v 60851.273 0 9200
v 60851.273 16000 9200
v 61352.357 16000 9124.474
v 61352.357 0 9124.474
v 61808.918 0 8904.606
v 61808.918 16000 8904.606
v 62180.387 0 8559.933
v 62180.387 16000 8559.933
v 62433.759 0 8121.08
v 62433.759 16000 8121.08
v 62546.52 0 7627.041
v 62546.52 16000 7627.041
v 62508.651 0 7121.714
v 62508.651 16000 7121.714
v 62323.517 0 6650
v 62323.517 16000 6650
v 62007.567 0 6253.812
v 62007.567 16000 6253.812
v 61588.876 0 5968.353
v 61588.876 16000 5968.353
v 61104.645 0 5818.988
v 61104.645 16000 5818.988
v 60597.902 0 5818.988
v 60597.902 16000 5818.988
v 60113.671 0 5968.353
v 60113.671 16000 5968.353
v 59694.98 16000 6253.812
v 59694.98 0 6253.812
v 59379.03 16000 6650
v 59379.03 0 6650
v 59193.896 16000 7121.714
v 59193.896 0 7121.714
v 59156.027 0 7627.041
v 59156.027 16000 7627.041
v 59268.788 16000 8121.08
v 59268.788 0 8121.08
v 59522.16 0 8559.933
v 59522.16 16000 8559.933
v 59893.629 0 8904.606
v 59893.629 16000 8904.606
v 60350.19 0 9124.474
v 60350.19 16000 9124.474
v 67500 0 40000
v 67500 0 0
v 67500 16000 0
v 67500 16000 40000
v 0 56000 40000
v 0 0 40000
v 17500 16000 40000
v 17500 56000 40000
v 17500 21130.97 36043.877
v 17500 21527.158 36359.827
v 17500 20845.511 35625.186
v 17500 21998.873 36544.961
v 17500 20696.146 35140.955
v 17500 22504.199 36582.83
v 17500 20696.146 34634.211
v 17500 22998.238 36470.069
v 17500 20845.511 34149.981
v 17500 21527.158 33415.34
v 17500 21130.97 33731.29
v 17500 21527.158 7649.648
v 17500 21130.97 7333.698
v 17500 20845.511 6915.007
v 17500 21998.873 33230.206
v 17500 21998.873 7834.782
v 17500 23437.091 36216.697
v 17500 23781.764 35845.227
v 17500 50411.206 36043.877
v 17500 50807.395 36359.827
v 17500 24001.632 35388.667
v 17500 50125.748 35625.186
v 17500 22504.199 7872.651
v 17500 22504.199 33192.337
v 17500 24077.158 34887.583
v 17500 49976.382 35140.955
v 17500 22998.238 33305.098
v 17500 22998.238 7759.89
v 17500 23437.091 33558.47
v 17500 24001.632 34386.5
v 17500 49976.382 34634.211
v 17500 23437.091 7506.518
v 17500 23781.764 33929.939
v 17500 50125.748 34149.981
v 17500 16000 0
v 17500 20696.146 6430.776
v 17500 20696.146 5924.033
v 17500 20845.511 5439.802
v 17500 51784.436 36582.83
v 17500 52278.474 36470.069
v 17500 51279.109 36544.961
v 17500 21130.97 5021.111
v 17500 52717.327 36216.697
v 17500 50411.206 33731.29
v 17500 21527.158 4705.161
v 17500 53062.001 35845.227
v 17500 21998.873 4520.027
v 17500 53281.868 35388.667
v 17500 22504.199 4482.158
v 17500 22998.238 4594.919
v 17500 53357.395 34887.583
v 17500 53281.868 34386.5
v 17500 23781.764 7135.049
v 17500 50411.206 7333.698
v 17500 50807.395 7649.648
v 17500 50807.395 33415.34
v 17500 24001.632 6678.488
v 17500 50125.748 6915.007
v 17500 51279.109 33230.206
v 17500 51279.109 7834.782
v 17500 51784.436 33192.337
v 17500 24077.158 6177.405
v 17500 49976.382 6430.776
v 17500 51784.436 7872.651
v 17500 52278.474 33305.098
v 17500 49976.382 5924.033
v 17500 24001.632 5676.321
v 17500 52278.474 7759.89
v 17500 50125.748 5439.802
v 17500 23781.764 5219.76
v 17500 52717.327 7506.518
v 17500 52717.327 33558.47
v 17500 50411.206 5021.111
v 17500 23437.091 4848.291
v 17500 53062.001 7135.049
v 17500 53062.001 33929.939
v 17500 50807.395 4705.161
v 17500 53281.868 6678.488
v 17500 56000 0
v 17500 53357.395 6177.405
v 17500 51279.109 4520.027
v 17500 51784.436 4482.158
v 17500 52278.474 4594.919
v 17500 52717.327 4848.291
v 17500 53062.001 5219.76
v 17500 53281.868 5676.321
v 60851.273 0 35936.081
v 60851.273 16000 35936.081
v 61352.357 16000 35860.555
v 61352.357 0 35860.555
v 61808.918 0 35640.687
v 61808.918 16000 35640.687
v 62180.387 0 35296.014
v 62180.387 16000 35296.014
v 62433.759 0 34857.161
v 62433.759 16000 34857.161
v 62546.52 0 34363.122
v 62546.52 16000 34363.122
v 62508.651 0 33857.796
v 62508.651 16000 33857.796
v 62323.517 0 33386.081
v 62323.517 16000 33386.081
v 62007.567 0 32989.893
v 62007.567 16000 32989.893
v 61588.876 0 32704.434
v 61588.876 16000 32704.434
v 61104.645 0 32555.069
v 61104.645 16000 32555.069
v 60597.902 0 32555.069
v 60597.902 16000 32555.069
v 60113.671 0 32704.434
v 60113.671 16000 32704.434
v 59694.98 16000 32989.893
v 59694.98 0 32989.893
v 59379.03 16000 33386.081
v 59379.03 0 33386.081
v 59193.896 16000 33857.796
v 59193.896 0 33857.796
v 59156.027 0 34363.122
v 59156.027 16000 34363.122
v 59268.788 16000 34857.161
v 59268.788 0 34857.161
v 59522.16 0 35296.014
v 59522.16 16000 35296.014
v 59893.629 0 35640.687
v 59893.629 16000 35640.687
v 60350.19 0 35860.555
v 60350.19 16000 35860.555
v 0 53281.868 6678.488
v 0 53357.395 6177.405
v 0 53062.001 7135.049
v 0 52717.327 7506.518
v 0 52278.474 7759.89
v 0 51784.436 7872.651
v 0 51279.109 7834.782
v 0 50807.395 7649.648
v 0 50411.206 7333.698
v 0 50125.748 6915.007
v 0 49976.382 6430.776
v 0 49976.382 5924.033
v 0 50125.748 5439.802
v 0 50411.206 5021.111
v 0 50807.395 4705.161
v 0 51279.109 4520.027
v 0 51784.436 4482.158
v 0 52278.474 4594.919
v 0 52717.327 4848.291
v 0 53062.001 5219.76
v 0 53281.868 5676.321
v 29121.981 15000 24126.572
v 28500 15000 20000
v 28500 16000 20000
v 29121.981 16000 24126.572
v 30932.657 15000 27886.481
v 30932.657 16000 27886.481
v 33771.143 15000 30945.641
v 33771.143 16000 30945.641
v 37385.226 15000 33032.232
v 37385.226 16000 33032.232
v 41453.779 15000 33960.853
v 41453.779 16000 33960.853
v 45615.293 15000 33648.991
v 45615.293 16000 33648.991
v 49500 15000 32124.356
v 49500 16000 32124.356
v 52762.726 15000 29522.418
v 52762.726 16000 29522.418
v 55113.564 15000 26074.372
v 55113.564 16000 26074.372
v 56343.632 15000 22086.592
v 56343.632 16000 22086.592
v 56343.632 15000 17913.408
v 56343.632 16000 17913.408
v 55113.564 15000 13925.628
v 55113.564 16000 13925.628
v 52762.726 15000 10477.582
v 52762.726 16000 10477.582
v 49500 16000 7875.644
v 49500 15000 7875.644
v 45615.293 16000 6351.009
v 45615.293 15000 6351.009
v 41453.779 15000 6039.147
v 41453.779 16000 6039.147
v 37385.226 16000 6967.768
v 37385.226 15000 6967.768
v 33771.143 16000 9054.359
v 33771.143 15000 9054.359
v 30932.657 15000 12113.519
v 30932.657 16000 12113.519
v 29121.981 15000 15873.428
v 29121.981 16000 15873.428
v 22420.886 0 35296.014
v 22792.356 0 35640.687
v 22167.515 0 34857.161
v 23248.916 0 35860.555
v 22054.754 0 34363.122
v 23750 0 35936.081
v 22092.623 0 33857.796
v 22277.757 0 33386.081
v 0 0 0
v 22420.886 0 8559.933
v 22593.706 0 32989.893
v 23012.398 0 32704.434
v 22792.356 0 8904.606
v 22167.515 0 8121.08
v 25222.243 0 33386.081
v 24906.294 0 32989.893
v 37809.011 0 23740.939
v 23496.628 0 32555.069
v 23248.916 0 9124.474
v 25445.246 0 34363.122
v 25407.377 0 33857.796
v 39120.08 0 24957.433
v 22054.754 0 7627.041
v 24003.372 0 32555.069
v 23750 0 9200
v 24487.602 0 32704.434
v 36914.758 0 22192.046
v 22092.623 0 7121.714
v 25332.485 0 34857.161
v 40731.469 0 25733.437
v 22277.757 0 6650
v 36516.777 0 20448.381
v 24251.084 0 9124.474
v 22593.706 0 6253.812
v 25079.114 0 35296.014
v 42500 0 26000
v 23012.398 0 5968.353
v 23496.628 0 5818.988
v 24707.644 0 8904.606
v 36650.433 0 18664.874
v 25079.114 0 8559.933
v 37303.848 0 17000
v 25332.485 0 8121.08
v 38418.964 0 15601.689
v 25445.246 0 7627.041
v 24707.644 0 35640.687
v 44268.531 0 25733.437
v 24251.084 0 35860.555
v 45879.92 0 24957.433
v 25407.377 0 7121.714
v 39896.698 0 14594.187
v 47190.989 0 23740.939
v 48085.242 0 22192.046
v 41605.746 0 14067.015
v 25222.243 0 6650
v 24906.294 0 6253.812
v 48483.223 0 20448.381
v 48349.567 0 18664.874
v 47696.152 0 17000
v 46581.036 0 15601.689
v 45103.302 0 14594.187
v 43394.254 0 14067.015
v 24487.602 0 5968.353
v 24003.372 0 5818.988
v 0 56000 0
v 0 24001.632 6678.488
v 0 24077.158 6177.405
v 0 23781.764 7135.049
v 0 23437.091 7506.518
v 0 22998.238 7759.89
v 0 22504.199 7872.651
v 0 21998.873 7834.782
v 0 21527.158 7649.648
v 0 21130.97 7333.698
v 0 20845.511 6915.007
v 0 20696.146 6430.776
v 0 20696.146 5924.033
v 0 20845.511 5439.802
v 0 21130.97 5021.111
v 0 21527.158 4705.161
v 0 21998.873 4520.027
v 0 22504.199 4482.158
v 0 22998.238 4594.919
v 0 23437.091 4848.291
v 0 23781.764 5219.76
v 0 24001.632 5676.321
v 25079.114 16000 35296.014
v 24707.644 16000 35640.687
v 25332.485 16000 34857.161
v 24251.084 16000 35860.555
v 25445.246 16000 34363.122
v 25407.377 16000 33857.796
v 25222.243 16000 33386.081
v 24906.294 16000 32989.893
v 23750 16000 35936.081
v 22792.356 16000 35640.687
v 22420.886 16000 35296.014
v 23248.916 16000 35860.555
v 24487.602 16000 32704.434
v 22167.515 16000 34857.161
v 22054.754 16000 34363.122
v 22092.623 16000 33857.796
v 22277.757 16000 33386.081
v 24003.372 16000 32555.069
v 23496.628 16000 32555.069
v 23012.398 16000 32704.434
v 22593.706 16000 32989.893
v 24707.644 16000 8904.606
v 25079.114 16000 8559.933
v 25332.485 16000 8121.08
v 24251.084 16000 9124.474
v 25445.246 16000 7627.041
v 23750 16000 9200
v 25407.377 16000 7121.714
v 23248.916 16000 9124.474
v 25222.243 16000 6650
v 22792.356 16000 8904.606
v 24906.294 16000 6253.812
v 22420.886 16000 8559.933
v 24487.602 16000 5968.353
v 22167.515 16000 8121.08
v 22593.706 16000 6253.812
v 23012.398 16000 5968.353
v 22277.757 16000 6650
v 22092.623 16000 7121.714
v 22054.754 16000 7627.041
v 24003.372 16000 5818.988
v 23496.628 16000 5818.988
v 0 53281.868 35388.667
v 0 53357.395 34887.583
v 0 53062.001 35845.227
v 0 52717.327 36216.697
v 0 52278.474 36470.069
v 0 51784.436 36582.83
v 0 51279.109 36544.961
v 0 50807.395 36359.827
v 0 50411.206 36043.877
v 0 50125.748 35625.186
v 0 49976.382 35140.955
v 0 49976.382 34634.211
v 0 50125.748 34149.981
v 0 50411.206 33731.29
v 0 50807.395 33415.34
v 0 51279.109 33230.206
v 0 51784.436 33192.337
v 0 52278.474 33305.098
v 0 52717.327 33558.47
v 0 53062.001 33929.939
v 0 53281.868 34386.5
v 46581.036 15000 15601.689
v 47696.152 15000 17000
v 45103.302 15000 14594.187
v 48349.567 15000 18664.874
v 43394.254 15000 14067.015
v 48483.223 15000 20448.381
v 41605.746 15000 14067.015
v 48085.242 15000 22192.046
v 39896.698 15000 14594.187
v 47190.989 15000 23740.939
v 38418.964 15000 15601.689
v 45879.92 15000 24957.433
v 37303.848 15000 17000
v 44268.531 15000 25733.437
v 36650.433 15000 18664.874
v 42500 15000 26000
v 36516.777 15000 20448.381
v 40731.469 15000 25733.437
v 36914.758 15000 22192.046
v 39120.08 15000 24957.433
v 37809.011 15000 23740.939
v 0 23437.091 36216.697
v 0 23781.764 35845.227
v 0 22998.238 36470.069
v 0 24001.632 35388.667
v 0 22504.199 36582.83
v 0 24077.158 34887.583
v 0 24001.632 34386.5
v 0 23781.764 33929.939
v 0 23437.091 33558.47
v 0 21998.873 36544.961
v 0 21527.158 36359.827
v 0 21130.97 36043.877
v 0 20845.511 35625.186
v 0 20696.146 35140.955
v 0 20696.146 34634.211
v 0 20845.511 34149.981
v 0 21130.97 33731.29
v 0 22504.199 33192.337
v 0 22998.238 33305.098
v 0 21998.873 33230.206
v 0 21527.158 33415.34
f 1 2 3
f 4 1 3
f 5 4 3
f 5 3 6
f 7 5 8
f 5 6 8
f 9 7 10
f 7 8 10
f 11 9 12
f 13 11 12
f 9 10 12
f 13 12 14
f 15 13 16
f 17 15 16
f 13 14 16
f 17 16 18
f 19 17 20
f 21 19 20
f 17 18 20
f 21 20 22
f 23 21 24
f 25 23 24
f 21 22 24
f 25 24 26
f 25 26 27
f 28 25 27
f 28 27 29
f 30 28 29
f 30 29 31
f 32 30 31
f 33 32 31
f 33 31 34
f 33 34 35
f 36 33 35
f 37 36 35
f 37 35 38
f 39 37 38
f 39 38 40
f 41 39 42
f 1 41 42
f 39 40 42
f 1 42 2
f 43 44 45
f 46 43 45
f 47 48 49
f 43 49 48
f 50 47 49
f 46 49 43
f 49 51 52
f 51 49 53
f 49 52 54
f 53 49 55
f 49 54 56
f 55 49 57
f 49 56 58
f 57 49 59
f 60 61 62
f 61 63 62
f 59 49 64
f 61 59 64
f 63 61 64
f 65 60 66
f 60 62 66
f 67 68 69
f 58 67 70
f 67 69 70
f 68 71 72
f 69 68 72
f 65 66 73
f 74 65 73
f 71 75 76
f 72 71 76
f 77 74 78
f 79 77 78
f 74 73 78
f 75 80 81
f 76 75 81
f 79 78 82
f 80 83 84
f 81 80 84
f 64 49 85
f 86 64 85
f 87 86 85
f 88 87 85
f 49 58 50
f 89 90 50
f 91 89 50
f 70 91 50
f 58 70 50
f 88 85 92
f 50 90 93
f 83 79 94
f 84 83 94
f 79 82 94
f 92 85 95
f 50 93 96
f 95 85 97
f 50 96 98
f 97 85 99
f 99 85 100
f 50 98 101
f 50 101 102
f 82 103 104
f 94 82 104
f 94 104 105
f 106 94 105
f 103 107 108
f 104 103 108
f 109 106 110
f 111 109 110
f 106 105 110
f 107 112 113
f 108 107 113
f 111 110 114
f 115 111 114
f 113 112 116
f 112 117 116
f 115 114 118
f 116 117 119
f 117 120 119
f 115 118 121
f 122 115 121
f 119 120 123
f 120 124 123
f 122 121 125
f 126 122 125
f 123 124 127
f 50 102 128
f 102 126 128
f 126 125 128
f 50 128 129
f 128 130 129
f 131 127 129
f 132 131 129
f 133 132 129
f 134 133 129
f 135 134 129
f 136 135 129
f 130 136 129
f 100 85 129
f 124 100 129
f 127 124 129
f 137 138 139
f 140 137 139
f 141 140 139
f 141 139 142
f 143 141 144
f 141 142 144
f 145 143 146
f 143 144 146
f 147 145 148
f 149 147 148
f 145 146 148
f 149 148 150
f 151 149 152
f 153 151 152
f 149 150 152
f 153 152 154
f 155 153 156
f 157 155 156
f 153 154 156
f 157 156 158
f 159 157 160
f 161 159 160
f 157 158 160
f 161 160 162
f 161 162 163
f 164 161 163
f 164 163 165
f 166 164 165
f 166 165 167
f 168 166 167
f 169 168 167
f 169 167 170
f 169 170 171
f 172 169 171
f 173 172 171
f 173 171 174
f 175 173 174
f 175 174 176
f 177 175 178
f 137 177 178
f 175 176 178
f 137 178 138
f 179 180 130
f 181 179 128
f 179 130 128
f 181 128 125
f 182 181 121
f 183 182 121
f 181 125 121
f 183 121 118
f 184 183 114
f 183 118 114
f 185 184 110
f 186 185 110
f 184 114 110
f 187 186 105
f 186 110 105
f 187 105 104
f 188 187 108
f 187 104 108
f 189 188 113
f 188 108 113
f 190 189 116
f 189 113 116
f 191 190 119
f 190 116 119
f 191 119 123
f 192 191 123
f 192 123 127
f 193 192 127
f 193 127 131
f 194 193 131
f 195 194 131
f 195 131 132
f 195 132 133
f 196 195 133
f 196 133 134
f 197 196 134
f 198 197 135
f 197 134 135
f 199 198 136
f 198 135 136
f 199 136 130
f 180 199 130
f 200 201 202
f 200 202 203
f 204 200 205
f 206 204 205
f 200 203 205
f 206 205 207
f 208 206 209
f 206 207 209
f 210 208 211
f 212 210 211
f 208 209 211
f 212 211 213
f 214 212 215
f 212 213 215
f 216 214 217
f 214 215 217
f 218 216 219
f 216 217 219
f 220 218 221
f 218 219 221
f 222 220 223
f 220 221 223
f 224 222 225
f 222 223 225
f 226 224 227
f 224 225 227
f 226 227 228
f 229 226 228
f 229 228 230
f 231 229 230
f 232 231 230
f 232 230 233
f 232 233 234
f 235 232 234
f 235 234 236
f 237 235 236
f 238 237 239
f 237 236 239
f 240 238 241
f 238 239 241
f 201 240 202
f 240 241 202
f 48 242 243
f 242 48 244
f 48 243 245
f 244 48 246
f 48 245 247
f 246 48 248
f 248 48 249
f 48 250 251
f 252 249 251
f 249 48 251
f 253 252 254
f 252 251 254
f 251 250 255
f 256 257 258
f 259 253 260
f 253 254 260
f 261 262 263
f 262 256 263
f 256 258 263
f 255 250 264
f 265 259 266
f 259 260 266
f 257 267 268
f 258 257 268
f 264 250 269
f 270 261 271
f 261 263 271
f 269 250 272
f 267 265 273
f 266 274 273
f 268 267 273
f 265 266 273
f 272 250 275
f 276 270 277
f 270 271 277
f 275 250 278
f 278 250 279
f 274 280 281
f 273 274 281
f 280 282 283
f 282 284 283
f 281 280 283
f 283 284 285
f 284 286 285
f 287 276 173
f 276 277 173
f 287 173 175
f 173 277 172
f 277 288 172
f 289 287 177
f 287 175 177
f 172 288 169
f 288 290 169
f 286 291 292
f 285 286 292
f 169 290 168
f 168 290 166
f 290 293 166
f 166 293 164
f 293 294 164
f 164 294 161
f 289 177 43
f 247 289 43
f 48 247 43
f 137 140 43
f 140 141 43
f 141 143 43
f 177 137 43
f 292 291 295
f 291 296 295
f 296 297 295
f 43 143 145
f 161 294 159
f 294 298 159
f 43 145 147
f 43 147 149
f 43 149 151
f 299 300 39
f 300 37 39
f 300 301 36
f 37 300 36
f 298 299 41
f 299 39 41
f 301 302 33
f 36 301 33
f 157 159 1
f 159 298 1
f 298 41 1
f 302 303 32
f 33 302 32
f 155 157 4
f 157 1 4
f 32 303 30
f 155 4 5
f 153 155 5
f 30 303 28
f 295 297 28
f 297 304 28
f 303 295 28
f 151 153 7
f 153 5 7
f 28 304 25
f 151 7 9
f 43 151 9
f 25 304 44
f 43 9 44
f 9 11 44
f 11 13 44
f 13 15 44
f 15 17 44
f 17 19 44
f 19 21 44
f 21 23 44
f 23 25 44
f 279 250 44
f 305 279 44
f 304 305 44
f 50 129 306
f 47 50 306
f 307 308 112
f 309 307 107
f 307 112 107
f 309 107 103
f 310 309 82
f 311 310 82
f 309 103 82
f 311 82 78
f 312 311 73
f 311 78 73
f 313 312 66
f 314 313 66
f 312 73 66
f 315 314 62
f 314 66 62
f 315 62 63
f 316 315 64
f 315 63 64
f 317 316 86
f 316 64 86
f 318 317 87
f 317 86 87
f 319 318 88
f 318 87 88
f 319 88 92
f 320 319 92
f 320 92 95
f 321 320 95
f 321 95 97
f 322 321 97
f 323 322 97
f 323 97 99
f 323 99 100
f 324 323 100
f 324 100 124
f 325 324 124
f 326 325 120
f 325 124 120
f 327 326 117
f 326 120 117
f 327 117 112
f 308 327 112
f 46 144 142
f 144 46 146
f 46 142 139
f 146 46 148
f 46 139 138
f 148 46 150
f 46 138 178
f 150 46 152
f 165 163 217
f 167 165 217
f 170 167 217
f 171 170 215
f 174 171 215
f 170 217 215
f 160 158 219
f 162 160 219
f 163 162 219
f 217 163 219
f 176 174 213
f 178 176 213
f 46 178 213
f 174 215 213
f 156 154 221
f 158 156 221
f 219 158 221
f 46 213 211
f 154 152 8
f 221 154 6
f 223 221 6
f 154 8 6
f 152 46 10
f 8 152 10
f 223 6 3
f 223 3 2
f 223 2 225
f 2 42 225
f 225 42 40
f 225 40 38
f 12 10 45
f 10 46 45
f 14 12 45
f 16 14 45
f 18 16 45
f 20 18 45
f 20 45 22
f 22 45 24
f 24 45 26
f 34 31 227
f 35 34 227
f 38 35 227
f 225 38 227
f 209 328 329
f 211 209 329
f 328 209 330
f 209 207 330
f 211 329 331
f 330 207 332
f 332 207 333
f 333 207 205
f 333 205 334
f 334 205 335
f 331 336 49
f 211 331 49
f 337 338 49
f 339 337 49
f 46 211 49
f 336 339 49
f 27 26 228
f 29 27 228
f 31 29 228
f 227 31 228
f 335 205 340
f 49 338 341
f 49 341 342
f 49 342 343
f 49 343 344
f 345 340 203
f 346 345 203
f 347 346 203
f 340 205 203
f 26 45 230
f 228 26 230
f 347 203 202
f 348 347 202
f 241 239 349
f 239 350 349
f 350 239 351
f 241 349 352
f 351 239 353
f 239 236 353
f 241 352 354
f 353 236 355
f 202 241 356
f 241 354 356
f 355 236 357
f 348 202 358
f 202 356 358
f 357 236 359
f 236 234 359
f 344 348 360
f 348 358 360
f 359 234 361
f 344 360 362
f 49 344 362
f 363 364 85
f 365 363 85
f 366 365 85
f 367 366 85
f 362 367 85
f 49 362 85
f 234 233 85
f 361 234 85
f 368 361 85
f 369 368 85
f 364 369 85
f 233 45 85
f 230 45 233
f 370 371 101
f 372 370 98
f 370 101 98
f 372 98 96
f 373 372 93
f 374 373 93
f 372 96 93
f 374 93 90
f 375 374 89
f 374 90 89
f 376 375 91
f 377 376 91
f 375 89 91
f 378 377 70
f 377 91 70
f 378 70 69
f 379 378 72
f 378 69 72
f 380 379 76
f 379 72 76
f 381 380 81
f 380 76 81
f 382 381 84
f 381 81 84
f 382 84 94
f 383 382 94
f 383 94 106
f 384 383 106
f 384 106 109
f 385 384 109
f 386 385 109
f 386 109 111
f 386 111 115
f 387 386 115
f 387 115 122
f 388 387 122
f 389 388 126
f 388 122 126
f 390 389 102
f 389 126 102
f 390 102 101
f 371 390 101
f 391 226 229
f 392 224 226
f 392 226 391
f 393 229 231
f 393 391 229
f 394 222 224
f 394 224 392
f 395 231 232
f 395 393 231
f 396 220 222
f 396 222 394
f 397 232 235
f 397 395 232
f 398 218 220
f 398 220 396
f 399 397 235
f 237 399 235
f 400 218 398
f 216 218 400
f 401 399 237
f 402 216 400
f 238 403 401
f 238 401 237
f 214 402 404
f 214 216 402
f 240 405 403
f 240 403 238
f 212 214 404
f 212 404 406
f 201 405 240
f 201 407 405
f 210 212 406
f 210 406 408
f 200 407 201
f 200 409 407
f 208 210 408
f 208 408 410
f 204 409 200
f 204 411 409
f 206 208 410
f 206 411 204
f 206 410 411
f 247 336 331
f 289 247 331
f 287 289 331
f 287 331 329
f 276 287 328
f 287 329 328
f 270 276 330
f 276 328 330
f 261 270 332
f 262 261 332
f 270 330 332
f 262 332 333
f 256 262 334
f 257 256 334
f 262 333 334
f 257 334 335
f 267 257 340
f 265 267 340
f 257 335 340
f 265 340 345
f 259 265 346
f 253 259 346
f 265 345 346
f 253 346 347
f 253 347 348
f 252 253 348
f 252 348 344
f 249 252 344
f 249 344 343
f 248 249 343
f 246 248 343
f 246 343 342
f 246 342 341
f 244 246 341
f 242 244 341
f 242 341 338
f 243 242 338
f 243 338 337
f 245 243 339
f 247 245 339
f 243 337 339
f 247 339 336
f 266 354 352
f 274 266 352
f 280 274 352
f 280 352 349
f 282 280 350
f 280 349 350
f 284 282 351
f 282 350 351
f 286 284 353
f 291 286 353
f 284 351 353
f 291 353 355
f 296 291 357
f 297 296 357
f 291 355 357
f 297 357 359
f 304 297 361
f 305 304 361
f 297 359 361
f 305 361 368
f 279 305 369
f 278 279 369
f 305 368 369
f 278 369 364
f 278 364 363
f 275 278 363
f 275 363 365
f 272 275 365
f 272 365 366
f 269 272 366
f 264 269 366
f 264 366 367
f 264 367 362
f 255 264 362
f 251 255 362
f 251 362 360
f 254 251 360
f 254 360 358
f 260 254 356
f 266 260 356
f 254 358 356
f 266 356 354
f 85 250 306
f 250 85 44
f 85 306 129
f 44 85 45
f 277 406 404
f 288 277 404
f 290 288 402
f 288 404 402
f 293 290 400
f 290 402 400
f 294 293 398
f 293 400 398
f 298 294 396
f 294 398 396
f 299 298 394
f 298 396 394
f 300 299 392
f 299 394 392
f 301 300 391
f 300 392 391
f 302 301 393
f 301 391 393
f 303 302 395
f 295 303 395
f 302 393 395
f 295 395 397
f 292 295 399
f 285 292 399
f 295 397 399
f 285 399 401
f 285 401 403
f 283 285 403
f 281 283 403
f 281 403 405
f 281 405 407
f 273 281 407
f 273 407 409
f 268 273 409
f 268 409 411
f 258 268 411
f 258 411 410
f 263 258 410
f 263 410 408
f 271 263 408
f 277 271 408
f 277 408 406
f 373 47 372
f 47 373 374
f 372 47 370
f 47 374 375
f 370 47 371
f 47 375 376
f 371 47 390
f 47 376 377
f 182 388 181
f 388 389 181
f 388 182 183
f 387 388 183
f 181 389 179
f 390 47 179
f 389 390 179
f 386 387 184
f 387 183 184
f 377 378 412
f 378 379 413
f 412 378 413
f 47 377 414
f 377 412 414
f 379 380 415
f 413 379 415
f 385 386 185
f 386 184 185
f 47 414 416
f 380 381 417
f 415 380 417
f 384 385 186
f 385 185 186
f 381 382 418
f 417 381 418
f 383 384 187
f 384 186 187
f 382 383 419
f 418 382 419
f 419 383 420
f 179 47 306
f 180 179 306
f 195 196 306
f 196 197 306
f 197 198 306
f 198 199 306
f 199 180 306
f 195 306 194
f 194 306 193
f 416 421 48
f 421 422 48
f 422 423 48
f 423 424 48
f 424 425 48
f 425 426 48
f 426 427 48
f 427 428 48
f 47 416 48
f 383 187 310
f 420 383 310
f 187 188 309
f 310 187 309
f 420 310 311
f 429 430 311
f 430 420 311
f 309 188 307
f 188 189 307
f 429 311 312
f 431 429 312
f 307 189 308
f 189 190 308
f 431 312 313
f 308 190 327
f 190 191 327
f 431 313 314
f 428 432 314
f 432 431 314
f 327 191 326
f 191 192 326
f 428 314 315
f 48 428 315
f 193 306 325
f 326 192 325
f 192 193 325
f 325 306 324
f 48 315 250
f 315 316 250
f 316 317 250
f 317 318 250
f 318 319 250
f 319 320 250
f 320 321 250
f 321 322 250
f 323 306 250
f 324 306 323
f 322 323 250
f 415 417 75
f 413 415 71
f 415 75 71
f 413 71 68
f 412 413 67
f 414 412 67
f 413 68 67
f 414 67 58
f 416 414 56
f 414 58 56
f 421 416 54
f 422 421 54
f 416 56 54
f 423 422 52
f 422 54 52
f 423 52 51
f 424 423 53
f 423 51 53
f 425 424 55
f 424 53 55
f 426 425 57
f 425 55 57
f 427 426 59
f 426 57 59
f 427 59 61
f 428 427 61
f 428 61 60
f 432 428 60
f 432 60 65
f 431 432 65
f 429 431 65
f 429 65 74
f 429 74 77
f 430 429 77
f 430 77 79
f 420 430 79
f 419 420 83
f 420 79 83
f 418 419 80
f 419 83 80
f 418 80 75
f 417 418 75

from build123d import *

# Parameters (mm, degrees)
BOSS_EXTRUDE1_DEPTH = 40000
SKETCH3_R           = 6000
SKETCH3_R_2         = 1700
CUT_EXTRUDE1_DEPTH  = 16000
SKETCH4_R           = 1700
CUT_EXTRUDE2_DEPTH  = 17500
SKETCH5_R           = 14000
CUT_EXTRUDE3_DEPTH  = 1000


with BuildPart() as part:
    # Sketch2 → Boss-Extrude1 (new body)
    with BuildSketch(Plane.XY):
        Polygon((0, 56000), (0, 0), (67500, 0), (67500, 16000), (17500, 16000), (17500, 56000), align=None)
    extrude(amount=BOSS_EXTRUDE1_DEPTH)

    # Sketch3 → Cut-Extrude1 (cut)
    with BuildSketch(Plane(origin=(0, 16000, 0), x_dir=(1, 0, 0), z_dir=(0, 1, 0))):
        with Locations(Location((42500, -20000, 0), (0, 0, 270))):
            Circle(SKETCH3_R)
        with Locations(Location((23750, -7500, 0), (0, 0, 270))):
            Circle(SKETCH3_R_2)
        with Locations(Location((60851.273434081, -7500, 0), (0, 0, 270))):
            Circle(SKETCH3_R_2)
        with Locations(Location((60851.273434081, -34236.081124855, 0), (0, 0, 270))):
            Circle(SKETCH3_R_2)
        with Locations(Location((23750, -34236.081124855, 0), (0, 0, 270))):
            Circle(SKETCH3_R_2)
    extrude(amount=-CUT_EXTRUDE1_DEPTH, mode=Mode.SUBTRACT)

    # Sketch4 → Cut-Extrude2 (cut)
    with BuildSketch(Plane(origin=(17500, 0, 0), x_dir=(0, 0, -1), z_dir=(1, 0, 0))):
        with Locations(Location((-34887.583341657, 51657.39458708, 0), (0, 0, 90))):
            Circle(SKETCH4_R)
        with Locations(Location((-6177.404587566, 51657.39458708, 0), (0, 0, 90))):
            Circle(SKETCH4_R)
        with Locations(Location((-34887.583341657, 22377.158132096, 0), (0, 0, 90))):
            Circle(SKETCH4_R)
        with Locations(Location((-6177.404587566, 22377.158132096, 0), (0, 0, 90))):
            Circle(SKETCH4_R)
    extrude(amount=-CUT_EXTRUDE2_DEPTH, mode=Mode.SUBTRACT)

    # Sketch5 → Cut-Extrude3 (cut)
    with BuildSketch(Plane(origin=(0, 16000, 0), x_dir=(1, 0, 0), z_dir=(0, 1, 0))):
        with Locations(Location((42500, -20000, 0), (0, 0, 180))):
            Circle(SKETCH5_R)
    extrude(amount=-CUT_EXTRUDE3_DEPTH, mode=Mode.SUBTRACT)


solid = part.part
